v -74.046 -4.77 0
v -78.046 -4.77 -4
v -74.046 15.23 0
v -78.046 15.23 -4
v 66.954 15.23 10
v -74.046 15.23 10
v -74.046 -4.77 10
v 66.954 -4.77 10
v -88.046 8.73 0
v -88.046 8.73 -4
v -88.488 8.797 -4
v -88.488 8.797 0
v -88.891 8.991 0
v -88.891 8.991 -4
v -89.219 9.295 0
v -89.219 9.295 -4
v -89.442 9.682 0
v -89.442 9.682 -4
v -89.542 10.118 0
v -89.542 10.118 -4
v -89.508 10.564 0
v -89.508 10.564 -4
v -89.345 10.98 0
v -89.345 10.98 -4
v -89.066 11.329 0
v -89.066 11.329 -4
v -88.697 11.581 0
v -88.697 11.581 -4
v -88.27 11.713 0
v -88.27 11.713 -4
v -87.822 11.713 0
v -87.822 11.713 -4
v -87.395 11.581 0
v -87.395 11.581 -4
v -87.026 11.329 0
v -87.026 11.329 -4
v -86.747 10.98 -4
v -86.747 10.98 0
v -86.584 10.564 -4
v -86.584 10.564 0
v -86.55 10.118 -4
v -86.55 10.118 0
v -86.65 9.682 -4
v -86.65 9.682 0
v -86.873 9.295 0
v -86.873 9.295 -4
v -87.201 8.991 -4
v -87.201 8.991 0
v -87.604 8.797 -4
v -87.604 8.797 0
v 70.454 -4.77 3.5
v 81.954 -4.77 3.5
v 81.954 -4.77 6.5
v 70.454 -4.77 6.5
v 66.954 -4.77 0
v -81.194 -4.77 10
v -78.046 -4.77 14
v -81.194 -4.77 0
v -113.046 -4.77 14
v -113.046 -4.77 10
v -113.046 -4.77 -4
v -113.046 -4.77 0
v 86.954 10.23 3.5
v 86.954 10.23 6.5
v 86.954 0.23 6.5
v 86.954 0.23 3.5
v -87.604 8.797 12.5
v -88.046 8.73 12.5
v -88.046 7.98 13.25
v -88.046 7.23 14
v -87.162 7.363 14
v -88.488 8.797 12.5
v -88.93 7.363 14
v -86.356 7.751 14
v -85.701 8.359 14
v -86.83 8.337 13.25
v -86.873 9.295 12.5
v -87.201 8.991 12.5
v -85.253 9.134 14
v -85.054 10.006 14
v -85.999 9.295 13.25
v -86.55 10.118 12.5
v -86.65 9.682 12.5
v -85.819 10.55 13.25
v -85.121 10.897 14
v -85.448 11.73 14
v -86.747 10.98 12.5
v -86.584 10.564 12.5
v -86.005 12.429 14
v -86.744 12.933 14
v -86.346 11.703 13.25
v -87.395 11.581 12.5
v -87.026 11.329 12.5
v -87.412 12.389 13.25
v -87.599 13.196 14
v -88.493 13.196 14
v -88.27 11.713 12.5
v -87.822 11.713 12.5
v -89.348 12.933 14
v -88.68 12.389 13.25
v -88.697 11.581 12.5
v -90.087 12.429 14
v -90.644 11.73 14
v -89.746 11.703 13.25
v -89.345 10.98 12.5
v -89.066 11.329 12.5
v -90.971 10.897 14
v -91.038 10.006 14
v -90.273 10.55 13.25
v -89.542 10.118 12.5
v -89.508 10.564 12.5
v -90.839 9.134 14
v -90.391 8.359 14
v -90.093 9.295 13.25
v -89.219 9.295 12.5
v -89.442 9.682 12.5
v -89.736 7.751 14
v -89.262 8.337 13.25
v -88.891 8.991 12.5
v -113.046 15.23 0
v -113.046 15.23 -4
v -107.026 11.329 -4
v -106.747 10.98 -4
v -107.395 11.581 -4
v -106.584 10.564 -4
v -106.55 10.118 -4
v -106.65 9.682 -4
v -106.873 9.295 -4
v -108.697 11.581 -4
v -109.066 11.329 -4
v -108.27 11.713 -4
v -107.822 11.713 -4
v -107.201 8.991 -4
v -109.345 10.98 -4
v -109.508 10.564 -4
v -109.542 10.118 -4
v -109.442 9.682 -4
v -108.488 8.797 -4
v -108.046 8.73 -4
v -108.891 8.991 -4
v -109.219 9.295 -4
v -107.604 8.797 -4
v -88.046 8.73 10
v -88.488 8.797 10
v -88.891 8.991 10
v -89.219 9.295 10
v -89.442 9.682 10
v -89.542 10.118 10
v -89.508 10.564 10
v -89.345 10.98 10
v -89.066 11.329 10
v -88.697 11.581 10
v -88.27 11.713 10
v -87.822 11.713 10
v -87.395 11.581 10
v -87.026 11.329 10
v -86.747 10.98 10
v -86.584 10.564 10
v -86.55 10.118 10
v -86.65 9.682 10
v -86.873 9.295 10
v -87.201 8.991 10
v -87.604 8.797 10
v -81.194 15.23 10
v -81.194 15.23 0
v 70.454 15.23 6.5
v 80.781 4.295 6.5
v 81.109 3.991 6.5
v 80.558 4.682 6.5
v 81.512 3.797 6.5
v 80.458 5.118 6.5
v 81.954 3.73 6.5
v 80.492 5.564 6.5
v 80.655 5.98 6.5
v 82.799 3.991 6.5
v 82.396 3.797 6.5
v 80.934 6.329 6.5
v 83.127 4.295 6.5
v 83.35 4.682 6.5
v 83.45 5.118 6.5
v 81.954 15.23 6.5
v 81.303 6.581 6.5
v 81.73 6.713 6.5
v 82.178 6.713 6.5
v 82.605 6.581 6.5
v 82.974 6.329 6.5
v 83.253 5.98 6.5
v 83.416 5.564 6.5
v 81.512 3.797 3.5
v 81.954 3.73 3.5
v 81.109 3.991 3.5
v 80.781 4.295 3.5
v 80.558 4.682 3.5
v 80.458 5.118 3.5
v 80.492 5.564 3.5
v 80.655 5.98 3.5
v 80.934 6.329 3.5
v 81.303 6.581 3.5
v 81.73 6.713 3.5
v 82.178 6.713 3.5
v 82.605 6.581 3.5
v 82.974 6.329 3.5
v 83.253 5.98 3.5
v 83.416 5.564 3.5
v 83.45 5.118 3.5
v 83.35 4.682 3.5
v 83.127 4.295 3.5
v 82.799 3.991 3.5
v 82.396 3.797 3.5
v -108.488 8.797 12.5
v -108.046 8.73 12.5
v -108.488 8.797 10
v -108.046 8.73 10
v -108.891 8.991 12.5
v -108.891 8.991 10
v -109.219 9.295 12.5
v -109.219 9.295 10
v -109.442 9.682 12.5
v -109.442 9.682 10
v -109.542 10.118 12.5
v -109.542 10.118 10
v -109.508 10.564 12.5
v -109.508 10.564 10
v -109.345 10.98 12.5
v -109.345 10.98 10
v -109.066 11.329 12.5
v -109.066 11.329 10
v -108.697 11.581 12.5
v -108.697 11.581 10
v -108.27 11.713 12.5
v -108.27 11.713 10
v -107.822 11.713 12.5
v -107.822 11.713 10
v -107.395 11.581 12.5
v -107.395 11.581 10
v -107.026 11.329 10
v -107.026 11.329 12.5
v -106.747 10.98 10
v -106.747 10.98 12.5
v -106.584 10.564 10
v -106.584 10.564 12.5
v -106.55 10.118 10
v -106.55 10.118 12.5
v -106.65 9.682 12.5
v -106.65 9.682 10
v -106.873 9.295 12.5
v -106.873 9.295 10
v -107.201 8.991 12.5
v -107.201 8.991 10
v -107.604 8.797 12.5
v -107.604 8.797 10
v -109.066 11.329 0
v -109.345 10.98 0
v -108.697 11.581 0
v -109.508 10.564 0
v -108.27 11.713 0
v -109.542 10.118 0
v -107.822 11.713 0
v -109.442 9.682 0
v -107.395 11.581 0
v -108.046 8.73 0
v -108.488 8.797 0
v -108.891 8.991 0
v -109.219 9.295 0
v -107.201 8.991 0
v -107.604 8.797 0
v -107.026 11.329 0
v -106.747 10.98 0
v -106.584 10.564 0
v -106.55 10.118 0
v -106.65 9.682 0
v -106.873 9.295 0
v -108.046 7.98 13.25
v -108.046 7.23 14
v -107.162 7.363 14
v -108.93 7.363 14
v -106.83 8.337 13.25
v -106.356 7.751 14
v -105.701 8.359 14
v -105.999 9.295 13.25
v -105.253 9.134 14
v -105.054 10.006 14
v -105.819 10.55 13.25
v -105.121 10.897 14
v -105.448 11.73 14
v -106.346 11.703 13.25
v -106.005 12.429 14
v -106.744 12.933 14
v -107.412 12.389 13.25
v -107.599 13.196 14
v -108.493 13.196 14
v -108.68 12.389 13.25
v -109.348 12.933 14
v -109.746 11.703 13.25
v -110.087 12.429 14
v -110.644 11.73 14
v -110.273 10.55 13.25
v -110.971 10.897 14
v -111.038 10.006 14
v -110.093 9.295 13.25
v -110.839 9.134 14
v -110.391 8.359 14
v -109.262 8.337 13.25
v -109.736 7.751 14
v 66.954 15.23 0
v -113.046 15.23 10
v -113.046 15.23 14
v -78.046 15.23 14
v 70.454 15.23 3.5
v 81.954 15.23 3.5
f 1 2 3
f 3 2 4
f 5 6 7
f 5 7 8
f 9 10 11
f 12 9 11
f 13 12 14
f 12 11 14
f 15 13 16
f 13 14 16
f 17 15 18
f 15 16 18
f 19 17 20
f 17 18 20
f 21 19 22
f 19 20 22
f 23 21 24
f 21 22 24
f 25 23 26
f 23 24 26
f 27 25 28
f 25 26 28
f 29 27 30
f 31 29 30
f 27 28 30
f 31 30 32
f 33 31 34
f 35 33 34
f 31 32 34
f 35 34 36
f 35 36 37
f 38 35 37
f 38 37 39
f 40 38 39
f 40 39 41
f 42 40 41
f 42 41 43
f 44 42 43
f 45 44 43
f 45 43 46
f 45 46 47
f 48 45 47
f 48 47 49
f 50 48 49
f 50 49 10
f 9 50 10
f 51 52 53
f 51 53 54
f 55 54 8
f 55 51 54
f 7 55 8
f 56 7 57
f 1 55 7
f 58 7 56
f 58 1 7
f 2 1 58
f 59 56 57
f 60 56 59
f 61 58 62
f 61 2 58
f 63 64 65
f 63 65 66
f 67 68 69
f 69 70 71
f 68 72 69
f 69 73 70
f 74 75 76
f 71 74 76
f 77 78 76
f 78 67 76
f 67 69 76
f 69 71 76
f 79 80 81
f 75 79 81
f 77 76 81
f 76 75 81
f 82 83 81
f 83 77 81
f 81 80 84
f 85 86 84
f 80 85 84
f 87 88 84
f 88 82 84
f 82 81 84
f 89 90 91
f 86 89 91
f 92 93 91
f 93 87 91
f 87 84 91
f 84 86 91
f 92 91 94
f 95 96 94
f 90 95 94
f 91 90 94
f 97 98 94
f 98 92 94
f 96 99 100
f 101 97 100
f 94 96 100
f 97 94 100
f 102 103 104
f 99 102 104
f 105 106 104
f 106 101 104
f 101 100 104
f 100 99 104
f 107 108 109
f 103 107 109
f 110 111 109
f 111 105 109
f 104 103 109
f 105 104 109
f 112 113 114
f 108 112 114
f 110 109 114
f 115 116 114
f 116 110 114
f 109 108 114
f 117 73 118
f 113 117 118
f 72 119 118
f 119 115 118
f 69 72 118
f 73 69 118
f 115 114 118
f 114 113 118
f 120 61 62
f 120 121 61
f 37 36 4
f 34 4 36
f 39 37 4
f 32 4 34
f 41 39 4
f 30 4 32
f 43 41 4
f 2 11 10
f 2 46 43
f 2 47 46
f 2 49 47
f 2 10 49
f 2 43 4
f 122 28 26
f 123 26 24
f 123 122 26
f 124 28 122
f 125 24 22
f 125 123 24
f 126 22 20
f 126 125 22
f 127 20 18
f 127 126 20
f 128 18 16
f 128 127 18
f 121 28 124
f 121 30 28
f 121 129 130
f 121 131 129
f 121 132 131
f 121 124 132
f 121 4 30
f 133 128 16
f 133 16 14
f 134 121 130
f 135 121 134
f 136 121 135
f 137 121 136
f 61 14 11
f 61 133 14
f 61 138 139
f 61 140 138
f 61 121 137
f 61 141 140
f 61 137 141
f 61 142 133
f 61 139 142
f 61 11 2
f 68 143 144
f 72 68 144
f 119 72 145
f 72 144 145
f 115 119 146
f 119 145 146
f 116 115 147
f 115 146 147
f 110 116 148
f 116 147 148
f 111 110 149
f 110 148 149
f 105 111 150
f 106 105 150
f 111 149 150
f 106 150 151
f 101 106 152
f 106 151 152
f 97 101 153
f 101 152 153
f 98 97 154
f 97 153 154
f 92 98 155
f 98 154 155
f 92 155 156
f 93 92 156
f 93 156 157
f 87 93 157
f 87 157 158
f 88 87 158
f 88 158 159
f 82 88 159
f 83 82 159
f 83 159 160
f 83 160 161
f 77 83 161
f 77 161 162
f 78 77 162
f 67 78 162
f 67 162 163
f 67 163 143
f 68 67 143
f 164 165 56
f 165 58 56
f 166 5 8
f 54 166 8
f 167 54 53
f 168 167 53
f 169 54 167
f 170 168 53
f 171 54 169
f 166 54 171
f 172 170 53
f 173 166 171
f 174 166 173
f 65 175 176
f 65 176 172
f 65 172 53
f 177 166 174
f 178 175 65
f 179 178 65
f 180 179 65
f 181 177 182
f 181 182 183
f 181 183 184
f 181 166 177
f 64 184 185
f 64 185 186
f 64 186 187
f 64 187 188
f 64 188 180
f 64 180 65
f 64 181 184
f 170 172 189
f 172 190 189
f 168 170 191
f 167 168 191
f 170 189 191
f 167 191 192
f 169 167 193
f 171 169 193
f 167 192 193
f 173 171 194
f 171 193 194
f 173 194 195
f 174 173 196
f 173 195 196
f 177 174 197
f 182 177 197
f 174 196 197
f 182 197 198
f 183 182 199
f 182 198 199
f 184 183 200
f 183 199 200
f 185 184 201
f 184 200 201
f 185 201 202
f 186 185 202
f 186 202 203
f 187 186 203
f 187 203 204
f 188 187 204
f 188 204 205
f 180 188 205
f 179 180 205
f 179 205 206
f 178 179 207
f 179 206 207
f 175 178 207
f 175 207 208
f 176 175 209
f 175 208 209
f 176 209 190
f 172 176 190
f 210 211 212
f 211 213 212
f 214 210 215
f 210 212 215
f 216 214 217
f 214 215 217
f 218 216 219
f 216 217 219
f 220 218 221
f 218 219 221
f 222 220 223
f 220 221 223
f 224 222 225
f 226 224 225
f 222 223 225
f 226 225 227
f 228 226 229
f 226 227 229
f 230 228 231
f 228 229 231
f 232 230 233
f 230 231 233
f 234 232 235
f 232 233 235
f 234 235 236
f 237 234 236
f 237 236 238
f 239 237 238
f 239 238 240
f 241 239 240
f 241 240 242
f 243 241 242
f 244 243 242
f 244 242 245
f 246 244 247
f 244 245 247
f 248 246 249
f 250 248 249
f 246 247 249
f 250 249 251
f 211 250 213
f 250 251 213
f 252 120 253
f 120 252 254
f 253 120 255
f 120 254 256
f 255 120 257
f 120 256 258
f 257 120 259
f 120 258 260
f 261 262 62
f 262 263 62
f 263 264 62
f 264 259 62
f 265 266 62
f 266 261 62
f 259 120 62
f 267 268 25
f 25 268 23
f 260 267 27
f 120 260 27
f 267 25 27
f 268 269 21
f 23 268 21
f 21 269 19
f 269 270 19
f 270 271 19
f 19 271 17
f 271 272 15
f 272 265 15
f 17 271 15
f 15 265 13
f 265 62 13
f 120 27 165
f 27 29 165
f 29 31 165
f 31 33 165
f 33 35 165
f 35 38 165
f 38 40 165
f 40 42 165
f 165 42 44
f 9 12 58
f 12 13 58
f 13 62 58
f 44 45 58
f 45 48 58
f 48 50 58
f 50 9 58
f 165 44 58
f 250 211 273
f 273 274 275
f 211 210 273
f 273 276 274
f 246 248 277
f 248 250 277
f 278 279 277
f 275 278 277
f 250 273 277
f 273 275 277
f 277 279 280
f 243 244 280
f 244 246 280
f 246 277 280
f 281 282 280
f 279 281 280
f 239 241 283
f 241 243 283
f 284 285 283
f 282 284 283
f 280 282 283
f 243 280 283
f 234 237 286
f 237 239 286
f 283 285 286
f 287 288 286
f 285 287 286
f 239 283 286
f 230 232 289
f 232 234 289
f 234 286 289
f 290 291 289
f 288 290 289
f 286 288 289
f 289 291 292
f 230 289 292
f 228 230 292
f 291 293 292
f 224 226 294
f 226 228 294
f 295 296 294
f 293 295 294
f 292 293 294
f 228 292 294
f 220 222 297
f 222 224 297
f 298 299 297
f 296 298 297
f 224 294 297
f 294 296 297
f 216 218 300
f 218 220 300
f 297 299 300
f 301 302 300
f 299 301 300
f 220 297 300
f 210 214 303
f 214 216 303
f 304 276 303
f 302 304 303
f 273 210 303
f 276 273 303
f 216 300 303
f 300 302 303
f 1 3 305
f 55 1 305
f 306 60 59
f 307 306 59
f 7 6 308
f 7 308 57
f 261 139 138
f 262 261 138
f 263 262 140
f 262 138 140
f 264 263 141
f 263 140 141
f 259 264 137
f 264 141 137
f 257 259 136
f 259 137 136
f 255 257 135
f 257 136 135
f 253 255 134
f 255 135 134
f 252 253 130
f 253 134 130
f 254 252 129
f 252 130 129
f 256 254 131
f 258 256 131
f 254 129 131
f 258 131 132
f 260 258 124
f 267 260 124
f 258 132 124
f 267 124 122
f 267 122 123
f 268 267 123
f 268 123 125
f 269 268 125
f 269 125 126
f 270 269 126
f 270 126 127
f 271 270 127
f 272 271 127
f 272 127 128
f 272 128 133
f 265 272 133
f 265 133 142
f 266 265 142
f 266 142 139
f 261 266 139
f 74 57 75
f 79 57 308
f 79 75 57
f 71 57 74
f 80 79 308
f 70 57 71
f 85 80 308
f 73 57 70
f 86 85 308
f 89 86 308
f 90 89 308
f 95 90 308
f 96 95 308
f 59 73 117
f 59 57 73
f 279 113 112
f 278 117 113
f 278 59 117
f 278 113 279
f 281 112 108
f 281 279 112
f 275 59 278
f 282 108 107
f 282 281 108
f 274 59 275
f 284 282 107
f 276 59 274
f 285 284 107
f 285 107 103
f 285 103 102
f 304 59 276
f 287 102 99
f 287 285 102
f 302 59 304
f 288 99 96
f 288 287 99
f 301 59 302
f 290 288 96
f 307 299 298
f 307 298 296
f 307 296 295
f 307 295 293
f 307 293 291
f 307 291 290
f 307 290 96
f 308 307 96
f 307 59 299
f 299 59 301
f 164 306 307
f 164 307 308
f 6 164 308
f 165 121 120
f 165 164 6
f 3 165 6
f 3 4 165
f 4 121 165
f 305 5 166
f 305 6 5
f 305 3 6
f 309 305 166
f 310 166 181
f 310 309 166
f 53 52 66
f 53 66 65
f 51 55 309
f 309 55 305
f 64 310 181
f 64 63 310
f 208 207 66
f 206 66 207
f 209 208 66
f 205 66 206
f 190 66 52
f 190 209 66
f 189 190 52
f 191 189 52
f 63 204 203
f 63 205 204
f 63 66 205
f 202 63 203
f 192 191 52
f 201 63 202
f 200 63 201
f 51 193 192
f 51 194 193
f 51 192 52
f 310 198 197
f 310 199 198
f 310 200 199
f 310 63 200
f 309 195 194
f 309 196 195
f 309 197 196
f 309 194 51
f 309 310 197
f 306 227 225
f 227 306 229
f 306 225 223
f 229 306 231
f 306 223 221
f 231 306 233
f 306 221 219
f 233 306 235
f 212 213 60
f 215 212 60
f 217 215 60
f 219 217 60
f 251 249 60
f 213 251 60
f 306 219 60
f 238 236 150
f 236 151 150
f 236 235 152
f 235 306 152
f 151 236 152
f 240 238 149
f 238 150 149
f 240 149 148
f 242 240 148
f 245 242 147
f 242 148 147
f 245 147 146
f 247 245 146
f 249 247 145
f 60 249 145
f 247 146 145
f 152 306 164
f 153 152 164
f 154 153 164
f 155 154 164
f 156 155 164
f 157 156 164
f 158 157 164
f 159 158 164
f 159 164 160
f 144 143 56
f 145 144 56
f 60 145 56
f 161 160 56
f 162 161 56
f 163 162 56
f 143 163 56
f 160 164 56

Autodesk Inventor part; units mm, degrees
ref_plane "YZ Plane" through (0, 0, 0) normal (1, 0, 0) x (0, 1, 0)
ref_plane "XZ Plane" through (0, 0, 0) normal (0, 1, 0) x (-1, 0, 0)
ref_plane "XY Plane" through (0, 0, 0) normal (0, 0, 1) x (1, 0, 0)
sketch "Sketch1" plane through (0, 0, 0) normal (0, 0, 1) x (1, 0, 0)
  line L0 (-83.046, 15.2299) -> (66.954, 15.2299)
  line L1 (66.954, 15.2299) -> (66.954, -4.7701)
  line L2 (66.954, -4.7701) -> (-83.046, -4.7701)
  line L3 (-83.046, -4.7701) -> (-83.046, 15.2299)
  point P0 (0, 0)
  dimension "d0" = 150
  dimension "d1" = 20
extrude "Extrusion1" add sketch "Sketch1" along normal blind 10
sketch "Sketch2" plane through (-83.046, -4.7701, 0) normal (-1, 0, 0) x (0, 0, 1)
  point P0 (0, 4.7701)
sketch "Sketch3" plane through (-83.046, -4.7701, 0) normal (-1, 0, 0) x (0, 0, 1)
  line L0 (0, 20) -> (-4, 20)
  line L1 (-4, 20) -> (-4, 0)
  line L2 (-4, 0) -> (0, 0)
  line L3 (0, 0) -> (0, 20)
  line L4 (10, 0) -> (14, 0)
  line L5 (14, 0) -> (14, 20)
  line L6 (14, 20) -> (10, 20)
  line L7 (10, 20) -> (10, 0)
  line L8 (0, 0) -> (10, 0) projected
  line L9 (10, 20) -> (10, 0) projected
  point P0 (0, 4.7701)
  dimension "d4" = 4
  dimension "d5" = 4
extrude "Extrusion2" add sketch "Sketch3" against normal blind 5
sketch "Sketch4" plane through (-83.046, -4.7701, 14) normal (-1, 0, 0) x (0, 0, 1)
  line L0 (-18, 20) -> (-14, 20)
  line L1 (-14, 20) -> (-14, 0)
  line L2 (-14, 0) -> (-18, 0)
  line L3 (-18, 0) -> (-18, 20)
  line L4 (0, 20) -> (-4, 20)
  line L5 (-4, 20) -> (-4, 0)
  line L6 (-4, 0) -> (0, 0)
  line L7 (0, 0) -> (0, 20)
  point P0 (-14, 4.7701)
extrude "Extrusion3" add sketch "Sketch4" along normal blind 30
sketch "Sketch5" plane through (-78.046, -4.7701, 14) normal (0, 0, 1) x (1, 0, 0)
  line L0 (-35, 0) -> (-35, 20) projected
  line L1 (-5, 20) -> (-35, 20) projected
  line L2 (-5, 0) -> (-5, 20) projected
  point P0 (78.046, 4.7701)
  point P1 (-30, 15)
  point P2 (-10, 15)
  dimension "d10" = 5
  dimension "d11" = 5
  dimension "d12" = 5
  dimension "d13" = 5
hole "Hole1" at (-108.046, 10.2299, 14) at (-88.046, 10.2299, 14) direction (0, 0, -1) diameter 3 depth 30 tip angle 118 countersink diameter 6 countersink angle 90
chamfer "Chamfer1" distance 4 angle 45 2 edges at (-78.046, 5.2299, 10) (-78.046, 5.2299, 0)
sketch "Sketch6" plane through (66.954, -4.7701, 0) normal (0, -1, 0) x (1, 0, 0)
  line L0 (0, -4) -> (-5, -4)
  line L1 (-5, -4) -> (-5, 14)
  line L2 (-5, 14) -> (0, 14)
  line L3 (0, 14) -> (0, -4)
  line L4 (0, 0) -> (-141, 0) projected
  line L5 (-141, 10) -> (0, 10) projected
  line L6 (0, 0) -> (0, 10) projected
  point P0 (-66.954, 0)
  dimension "d24" = 4
  dimension "d25" = 4
  dimension "d26" = 5
extrude "Extrusion4" add sketch "Sketch6" against normal blind 20
sketch "Sketch7" plane through (-113.046, -4.7701, 10) normal (0, -1, 0) x (1, 0, 0)
  line L0 (180, -14) -> (210, -14)
  line L1 (210, -14) -> (210, -10)
  line L2 (210, -10) -> (180, -10)
  line L3 (180, -10) -> (180, -14)
  line L4 (180, 4) -> (210, 4)
  line L5 (210, 4) -> (210, 0)
  line L6 (210, 0) -> (180, 0)
  line L7 (180, 0) -> (180, 4)
  point P0 (113.046, -10)
  dimension "d29" = 30
  dimension "d30" = 30
  dimension "d31" = 4
  dimension "d32" = 4
extrude "Extrusion5" add sketch "Sketch7" against normal blind 20
chamfer "Chamfer2" distance 4 angle 45 2 edges at (61.954, 5.2299, 10) (61.954, 5.2299, 0)
sketch "Sketch8" plane through (96.954, -4.7701, 14) normal (0, 0, 1) x (1, 0, 0)
  line L0 (-30, 20) -> (-30, 0) projected
  line L1 (0, 0) -> (0, 20) projected
  line L2 (-35, 20) -> (0, 20) projected
  line L3 (-35, 0) -> (0, 0) projected
  circle A0 centre (-25, 5) radius 2
  circle A1 centre (-25, 15) radius 2
  circle A2 centre (-5, 5) radius 2
  circle A3 centre (-5, 15) radius 2
  line L4 (-25, 3) -> (-5, 3)
  line L5 (-5, 7) -> (-25, 7)
  line L6 (-25, 13) -> (-5, 13)
  line L7 (-5, 17) -> (-25, 17)
  point P0 (-96.954, 4.7701)
  dimension "d38" = 5
  dimension "d39" = 5
  dimension "d40" = 5
  dimension "d41" = 5
  dimension "d42" = 5
  dimension "d43" = 5
  dimension "d44" = 5
  dimension "d45" = 5
  dimension "d46" = 4
  dimension "d47" = 4
  dimension "d48" = 4
  dimension "d49" = 4
extrude "Extrusion6" cut sketch "Sketch8" against normal blind 20 contours A0 | A0 L5 A2 L4 | A2 | A1 | A1 L7 A3 L6 | A3
sketch "Sketch9" plane through (-113.046, -4.7701, 10) normal (0, -1, 0) x (1, 0, 0)
  line L0 (30, -10) -> (31.8516, -10)
  line L1 (31.8516, -10) -> (31.8516, 0)
  line L2 (31.8516, 0) -> (30, 0)
  line L3 (30, 0) -> (30, -10)
  line L4 (30, 0) -> (0, 0) projected
  point P0 (113.046, -10)
  dimension "d52" = 1.8516
extrude "Extrusion7" cut sketch "Sketch9" against normal blind 20
sketch "Sketch10" plane through (-113.046, 15.2299, 14) normal (0, 1, 0) x (1, 0, 0)
  line L0 (171, 4) -> (210, 4)
  line L1 (210, 4) -> (210, 0)
  line L2 (210, 0) -> (171, 0)
  line L3 (171, 0) -> (171, 4)
  line L4 (210, 18) -> (171, 18)
  line L5 (171, 18) -> (171, 14)
  line L6 (171, 14) -> (210, 14)
  line L7 (210, 14) -> (210, 18)
  line L8 (180, 14) -> (210, 14) projected
  point P0 (113.046, 14)
extrude "Extrusion8" cut sketch "Sketch10" against normal blind 20
sketch "Sketch11" plane through (66.954, 15.2299, 10) normal (0, 1, 0) x (1, 0, 0)
  line L0 (0, 0) -> (0, 10) projected
  line L1 (0, 3.5) -> (20, 3.5)
  line L2 (20, 3.5) -> (20, 6.5)
  line L3 (20, 6.5) -> (0, 6.5)
  line L4 (0, 6.5) -> (0, 3.5)
  line L5 (0, 0) -> (-141, 0) projected
  point P0 (-66.954, 10)
  dimension "d57" = 3
  dimension "d58" = 3.5
  dimension "d59" = 20
extrude "Extrusion9" add sketch "Sketch11" against normal blind 20
sketch "Sketch12" plane through (66.954, 15.2299, 6.5) normal (0, 0, 1) x (1, 0, 0)
  line L0 (20, -20) -> (0, -20) projected
  line L1 (20, 0) -> (20, -20) projected
  point P0 (-66.954, -15.2299)
  point P1 (15, -10)
  dimension "d62" = 10
  dimension "d63" = 5
hole "Hole2" at (81.954, 5.2299, 6.5) direction (0, 0, -1) diameter 3 depth 8 tip angle 118
chamfer "Chamfer3" distance 5 angle 45 2 edges at (86.954, -4.7701, 5) (86.954, 15.2299, 5)
chamfer "Chamfer4" distance 3.5 angle 45 2 edges at (66.954, 5.2299, 6.5) (66.954, 5.2299, 3.5)
properties part number "Upper Support beam v2"
